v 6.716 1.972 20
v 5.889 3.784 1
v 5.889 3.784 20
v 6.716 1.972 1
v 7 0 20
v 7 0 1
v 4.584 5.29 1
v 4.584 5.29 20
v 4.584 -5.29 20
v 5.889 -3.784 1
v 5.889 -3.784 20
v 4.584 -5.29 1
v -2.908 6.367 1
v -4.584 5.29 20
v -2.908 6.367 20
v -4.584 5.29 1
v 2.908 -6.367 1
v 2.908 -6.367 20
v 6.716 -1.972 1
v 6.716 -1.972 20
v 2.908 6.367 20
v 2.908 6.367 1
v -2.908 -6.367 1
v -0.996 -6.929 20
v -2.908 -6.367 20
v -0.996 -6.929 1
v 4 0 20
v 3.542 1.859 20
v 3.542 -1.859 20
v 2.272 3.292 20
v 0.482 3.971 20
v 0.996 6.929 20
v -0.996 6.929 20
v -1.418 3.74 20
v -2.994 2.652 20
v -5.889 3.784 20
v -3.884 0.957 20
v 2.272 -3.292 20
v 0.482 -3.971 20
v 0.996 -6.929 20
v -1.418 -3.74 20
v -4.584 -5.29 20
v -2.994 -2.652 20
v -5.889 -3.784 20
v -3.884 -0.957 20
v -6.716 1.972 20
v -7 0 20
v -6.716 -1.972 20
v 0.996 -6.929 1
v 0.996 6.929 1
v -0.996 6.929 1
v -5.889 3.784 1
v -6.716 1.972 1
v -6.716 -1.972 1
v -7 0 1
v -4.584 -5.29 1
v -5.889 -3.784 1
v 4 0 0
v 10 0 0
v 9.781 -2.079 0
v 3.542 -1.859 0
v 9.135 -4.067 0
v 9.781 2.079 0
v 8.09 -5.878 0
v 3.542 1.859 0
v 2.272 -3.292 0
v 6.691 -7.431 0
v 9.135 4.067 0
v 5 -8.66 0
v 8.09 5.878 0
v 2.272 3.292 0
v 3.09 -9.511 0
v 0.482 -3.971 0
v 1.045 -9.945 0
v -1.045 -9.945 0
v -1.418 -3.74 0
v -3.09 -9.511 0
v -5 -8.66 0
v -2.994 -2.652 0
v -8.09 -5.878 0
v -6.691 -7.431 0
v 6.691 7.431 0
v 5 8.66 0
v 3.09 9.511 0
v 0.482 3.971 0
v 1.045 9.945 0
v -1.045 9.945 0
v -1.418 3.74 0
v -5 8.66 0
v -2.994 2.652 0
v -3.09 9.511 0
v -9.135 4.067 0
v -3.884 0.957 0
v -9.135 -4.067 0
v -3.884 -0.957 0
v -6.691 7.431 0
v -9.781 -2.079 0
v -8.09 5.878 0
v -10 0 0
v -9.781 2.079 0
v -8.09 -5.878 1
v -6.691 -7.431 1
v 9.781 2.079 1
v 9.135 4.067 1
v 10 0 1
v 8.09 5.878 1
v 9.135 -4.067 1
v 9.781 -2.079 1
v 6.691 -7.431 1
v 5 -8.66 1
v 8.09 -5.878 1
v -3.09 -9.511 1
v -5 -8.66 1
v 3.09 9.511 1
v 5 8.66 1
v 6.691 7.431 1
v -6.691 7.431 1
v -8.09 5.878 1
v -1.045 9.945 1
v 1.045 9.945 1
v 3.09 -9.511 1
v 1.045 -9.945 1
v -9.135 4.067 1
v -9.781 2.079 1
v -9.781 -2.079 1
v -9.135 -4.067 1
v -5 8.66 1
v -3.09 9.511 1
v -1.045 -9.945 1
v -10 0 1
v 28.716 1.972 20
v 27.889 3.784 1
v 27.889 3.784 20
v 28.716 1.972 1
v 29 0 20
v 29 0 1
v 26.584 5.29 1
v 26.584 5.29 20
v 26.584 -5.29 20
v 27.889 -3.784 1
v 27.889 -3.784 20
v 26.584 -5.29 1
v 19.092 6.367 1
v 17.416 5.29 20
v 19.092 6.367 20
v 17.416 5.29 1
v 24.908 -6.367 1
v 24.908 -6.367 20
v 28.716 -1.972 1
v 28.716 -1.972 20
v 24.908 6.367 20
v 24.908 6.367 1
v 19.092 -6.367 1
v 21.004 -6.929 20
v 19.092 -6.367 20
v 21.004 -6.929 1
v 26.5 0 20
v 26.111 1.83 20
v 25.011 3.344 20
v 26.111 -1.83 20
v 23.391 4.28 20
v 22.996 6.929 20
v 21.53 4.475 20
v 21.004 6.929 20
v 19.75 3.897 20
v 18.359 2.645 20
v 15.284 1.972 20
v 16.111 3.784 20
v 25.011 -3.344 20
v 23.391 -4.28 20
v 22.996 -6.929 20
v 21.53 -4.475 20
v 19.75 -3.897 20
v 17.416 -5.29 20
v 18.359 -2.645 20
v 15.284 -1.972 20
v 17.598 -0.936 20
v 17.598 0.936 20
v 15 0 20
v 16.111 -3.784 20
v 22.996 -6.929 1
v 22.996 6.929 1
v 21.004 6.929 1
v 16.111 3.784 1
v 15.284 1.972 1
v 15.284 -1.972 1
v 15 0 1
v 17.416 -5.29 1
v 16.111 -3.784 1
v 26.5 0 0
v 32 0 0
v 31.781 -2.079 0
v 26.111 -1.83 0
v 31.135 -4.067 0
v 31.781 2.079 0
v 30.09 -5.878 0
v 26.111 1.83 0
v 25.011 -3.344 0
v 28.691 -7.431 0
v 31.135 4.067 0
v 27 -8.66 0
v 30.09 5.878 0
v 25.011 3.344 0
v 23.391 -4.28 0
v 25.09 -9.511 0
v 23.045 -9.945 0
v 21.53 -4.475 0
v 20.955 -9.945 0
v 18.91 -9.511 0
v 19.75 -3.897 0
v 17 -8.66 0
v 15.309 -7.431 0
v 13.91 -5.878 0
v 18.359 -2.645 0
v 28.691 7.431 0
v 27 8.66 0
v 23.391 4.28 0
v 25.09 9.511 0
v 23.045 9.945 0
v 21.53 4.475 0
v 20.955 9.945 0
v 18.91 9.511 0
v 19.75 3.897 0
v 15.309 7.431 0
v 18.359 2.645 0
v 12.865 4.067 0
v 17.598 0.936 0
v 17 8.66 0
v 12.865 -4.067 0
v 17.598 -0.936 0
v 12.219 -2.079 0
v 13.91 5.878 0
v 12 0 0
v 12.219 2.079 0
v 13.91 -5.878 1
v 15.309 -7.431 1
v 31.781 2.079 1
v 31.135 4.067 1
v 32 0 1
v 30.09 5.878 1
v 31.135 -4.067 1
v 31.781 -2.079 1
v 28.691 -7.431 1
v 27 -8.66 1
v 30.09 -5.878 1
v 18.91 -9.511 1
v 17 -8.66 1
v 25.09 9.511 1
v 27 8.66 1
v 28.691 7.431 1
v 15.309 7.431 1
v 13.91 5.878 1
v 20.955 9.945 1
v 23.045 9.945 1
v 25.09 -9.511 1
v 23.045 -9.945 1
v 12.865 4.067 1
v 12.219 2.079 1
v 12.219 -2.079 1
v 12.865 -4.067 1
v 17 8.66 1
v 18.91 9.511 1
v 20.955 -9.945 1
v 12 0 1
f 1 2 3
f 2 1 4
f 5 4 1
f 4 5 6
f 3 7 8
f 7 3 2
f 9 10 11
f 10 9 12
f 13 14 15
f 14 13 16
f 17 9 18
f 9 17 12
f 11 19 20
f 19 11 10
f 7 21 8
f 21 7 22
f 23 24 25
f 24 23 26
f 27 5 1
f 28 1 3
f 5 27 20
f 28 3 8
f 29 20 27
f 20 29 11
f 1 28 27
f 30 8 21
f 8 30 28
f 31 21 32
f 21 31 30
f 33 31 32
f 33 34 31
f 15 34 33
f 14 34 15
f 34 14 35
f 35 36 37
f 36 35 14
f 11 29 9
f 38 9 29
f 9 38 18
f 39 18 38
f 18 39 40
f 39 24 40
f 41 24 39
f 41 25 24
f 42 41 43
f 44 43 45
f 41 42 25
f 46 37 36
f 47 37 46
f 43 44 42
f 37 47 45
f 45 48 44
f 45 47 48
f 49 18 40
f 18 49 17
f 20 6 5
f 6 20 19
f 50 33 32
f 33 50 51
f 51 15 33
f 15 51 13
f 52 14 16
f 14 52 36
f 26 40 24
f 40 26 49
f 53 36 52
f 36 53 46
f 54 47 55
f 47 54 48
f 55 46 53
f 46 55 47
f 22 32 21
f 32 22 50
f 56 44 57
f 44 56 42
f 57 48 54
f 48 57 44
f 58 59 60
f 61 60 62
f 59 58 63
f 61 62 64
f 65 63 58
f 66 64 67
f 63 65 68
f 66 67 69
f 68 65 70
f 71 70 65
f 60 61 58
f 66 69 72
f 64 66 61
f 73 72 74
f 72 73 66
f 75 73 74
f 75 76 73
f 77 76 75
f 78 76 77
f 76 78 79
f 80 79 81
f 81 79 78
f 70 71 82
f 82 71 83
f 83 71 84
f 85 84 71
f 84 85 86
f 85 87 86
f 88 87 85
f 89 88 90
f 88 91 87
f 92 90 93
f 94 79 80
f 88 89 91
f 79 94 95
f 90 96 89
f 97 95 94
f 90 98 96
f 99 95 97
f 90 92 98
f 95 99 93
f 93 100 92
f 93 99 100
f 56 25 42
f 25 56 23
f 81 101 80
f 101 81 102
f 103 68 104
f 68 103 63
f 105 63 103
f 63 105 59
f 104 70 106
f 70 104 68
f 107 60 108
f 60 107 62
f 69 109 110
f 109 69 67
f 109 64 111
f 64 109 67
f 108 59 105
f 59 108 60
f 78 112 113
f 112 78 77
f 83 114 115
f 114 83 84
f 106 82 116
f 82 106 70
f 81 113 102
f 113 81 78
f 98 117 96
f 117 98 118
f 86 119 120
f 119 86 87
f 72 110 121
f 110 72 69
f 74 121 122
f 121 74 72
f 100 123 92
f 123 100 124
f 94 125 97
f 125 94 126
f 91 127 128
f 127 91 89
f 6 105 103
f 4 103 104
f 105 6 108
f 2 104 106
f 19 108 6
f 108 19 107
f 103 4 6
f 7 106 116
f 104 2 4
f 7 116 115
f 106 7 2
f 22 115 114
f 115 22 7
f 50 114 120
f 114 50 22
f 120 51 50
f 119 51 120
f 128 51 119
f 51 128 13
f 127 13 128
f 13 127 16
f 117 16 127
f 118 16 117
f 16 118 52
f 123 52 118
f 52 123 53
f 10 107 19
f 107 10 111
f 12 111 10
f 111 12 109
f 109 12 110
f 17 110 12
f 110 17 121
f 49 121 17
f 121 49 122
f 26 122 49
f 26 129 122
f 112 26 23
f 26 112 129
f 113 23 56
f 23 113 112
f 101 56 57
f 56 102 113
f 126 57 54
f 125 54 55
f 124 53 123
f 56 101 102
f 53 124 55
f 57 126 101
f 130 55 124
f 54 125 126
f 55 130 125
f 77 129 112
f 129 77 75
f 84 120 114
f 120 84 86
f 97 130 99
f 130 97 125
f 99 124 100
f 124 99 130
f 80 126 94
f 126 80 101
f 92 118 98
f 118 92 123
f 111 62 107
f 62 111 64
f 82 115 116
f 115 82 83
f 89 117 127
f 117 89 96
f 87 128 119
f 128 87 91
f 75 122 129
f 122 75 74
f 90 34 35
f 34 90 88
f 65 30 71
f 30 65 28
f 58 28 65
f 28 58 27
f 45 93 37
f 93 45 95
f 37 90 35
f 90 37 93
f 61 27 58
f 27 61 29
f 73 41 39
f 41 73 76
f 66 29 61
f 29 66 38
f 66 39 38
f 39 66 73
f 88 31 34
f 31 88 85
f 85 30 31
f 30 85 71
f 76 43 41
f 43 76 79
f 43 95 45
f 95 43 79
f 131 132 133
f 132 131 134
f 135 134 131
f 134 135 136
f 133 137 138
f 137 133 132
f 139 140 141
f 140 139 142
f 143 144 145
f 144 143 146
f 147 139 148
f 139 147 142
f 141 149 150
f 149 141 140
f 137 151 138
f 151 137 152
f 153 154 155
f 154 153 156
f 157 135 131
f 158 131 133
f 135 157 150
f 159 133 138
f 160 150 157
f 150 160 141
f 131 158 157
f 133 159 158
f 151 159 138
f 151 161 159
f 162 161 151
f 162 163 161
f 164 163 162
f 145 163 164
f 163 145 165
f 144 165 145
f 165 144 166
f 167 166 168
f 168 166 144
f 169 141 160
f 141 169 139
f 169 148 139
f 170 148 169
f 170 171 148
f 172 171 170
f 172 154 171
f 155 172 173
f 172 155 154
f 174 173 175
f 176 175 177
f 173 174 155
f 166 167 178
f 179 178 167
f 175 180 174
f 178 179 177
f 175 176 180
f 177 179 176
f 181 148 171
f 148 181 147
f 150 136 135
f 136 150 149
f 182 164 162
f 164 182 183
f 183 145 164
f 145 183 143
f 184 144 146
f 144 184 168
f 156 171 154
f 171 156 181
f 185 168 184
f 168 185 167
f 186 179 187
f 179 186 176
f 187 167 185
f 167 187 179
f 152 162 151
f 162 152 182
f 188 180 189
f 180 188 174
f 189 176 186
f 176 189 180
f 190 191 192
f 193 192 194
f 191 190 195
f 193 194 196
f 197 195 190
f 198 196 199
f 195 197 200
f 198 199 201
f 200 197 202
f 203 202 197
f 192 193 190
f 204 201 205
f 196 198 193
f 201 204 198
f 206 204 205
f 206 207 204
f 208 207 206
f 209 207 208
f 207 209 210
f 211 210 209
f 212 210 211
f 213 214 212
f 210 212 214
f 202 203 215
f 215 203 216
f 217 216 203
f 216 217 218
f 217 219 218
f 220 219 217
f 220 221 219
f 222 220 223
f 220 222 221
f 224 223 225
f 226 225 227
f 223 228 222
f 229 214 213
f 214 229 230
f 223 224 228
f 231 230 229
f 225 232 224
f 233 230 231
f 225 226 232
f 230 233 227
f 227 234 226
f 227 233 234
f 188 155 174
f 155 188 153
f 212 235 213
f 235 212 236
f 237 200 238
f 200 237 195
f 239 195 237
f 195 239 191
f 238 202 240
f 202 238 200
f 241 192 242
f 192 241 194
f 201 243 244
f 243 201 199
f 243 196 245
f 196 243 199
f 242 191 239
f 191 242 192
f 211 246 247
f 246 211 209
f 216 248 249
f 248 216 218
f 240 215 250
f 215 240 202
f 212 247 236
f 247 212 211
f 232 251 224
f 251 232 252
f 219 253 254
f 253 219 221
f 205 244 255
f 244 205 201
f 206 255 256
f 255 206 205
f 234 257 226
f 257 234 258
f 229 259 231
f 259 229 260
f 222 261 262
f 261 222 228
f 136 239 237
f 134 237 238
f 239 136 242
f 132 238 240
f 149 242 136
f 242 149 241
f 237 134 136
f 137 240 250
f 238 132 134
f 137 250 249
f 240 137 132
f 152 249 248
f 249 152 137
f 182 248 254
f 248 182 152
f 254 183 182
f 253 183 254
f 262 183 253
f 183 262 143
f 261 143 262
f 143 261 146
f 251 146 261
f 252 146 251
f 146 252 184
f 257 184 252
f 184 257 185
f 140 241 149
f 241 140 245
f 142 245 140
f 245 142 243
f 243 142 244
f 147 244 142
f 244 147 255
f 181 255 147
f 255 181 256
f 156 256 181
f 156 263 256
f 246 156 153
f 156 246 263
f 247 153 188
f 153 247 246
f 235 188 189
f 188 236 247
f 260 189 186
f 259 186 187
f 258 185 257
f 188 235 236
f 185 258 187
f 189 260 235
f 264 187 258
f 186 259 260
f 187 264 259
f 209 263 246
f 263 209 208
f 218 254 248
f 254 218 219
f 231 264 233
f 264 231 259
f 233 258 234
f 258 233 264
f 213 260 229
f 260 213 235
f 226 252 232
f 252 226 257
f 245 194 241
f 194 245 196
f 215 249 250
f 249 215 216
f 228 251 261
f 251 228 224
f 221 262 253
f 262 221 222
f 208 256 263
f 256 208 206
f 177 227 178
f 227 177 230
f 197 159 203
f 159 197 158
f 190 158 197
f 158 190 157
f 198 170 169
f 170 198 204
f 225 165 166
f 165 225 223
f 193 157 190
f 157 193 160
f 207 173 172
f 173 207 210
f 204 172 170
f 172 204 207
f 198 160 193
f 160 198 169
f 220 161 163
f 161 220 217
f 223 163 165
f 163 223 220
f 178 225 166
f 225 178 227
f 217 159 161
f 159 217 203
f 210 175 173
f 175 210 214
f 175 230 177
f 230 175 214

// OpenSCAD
for(i=[0:1])
translate([22*i,0,0])
difference(){
	union(){
		cylinder(r=(14)/2,h=20);
		cylinder(r=20/2,h=1);
	}
	cylinder(r=(8+i)/2,h=20);
}
